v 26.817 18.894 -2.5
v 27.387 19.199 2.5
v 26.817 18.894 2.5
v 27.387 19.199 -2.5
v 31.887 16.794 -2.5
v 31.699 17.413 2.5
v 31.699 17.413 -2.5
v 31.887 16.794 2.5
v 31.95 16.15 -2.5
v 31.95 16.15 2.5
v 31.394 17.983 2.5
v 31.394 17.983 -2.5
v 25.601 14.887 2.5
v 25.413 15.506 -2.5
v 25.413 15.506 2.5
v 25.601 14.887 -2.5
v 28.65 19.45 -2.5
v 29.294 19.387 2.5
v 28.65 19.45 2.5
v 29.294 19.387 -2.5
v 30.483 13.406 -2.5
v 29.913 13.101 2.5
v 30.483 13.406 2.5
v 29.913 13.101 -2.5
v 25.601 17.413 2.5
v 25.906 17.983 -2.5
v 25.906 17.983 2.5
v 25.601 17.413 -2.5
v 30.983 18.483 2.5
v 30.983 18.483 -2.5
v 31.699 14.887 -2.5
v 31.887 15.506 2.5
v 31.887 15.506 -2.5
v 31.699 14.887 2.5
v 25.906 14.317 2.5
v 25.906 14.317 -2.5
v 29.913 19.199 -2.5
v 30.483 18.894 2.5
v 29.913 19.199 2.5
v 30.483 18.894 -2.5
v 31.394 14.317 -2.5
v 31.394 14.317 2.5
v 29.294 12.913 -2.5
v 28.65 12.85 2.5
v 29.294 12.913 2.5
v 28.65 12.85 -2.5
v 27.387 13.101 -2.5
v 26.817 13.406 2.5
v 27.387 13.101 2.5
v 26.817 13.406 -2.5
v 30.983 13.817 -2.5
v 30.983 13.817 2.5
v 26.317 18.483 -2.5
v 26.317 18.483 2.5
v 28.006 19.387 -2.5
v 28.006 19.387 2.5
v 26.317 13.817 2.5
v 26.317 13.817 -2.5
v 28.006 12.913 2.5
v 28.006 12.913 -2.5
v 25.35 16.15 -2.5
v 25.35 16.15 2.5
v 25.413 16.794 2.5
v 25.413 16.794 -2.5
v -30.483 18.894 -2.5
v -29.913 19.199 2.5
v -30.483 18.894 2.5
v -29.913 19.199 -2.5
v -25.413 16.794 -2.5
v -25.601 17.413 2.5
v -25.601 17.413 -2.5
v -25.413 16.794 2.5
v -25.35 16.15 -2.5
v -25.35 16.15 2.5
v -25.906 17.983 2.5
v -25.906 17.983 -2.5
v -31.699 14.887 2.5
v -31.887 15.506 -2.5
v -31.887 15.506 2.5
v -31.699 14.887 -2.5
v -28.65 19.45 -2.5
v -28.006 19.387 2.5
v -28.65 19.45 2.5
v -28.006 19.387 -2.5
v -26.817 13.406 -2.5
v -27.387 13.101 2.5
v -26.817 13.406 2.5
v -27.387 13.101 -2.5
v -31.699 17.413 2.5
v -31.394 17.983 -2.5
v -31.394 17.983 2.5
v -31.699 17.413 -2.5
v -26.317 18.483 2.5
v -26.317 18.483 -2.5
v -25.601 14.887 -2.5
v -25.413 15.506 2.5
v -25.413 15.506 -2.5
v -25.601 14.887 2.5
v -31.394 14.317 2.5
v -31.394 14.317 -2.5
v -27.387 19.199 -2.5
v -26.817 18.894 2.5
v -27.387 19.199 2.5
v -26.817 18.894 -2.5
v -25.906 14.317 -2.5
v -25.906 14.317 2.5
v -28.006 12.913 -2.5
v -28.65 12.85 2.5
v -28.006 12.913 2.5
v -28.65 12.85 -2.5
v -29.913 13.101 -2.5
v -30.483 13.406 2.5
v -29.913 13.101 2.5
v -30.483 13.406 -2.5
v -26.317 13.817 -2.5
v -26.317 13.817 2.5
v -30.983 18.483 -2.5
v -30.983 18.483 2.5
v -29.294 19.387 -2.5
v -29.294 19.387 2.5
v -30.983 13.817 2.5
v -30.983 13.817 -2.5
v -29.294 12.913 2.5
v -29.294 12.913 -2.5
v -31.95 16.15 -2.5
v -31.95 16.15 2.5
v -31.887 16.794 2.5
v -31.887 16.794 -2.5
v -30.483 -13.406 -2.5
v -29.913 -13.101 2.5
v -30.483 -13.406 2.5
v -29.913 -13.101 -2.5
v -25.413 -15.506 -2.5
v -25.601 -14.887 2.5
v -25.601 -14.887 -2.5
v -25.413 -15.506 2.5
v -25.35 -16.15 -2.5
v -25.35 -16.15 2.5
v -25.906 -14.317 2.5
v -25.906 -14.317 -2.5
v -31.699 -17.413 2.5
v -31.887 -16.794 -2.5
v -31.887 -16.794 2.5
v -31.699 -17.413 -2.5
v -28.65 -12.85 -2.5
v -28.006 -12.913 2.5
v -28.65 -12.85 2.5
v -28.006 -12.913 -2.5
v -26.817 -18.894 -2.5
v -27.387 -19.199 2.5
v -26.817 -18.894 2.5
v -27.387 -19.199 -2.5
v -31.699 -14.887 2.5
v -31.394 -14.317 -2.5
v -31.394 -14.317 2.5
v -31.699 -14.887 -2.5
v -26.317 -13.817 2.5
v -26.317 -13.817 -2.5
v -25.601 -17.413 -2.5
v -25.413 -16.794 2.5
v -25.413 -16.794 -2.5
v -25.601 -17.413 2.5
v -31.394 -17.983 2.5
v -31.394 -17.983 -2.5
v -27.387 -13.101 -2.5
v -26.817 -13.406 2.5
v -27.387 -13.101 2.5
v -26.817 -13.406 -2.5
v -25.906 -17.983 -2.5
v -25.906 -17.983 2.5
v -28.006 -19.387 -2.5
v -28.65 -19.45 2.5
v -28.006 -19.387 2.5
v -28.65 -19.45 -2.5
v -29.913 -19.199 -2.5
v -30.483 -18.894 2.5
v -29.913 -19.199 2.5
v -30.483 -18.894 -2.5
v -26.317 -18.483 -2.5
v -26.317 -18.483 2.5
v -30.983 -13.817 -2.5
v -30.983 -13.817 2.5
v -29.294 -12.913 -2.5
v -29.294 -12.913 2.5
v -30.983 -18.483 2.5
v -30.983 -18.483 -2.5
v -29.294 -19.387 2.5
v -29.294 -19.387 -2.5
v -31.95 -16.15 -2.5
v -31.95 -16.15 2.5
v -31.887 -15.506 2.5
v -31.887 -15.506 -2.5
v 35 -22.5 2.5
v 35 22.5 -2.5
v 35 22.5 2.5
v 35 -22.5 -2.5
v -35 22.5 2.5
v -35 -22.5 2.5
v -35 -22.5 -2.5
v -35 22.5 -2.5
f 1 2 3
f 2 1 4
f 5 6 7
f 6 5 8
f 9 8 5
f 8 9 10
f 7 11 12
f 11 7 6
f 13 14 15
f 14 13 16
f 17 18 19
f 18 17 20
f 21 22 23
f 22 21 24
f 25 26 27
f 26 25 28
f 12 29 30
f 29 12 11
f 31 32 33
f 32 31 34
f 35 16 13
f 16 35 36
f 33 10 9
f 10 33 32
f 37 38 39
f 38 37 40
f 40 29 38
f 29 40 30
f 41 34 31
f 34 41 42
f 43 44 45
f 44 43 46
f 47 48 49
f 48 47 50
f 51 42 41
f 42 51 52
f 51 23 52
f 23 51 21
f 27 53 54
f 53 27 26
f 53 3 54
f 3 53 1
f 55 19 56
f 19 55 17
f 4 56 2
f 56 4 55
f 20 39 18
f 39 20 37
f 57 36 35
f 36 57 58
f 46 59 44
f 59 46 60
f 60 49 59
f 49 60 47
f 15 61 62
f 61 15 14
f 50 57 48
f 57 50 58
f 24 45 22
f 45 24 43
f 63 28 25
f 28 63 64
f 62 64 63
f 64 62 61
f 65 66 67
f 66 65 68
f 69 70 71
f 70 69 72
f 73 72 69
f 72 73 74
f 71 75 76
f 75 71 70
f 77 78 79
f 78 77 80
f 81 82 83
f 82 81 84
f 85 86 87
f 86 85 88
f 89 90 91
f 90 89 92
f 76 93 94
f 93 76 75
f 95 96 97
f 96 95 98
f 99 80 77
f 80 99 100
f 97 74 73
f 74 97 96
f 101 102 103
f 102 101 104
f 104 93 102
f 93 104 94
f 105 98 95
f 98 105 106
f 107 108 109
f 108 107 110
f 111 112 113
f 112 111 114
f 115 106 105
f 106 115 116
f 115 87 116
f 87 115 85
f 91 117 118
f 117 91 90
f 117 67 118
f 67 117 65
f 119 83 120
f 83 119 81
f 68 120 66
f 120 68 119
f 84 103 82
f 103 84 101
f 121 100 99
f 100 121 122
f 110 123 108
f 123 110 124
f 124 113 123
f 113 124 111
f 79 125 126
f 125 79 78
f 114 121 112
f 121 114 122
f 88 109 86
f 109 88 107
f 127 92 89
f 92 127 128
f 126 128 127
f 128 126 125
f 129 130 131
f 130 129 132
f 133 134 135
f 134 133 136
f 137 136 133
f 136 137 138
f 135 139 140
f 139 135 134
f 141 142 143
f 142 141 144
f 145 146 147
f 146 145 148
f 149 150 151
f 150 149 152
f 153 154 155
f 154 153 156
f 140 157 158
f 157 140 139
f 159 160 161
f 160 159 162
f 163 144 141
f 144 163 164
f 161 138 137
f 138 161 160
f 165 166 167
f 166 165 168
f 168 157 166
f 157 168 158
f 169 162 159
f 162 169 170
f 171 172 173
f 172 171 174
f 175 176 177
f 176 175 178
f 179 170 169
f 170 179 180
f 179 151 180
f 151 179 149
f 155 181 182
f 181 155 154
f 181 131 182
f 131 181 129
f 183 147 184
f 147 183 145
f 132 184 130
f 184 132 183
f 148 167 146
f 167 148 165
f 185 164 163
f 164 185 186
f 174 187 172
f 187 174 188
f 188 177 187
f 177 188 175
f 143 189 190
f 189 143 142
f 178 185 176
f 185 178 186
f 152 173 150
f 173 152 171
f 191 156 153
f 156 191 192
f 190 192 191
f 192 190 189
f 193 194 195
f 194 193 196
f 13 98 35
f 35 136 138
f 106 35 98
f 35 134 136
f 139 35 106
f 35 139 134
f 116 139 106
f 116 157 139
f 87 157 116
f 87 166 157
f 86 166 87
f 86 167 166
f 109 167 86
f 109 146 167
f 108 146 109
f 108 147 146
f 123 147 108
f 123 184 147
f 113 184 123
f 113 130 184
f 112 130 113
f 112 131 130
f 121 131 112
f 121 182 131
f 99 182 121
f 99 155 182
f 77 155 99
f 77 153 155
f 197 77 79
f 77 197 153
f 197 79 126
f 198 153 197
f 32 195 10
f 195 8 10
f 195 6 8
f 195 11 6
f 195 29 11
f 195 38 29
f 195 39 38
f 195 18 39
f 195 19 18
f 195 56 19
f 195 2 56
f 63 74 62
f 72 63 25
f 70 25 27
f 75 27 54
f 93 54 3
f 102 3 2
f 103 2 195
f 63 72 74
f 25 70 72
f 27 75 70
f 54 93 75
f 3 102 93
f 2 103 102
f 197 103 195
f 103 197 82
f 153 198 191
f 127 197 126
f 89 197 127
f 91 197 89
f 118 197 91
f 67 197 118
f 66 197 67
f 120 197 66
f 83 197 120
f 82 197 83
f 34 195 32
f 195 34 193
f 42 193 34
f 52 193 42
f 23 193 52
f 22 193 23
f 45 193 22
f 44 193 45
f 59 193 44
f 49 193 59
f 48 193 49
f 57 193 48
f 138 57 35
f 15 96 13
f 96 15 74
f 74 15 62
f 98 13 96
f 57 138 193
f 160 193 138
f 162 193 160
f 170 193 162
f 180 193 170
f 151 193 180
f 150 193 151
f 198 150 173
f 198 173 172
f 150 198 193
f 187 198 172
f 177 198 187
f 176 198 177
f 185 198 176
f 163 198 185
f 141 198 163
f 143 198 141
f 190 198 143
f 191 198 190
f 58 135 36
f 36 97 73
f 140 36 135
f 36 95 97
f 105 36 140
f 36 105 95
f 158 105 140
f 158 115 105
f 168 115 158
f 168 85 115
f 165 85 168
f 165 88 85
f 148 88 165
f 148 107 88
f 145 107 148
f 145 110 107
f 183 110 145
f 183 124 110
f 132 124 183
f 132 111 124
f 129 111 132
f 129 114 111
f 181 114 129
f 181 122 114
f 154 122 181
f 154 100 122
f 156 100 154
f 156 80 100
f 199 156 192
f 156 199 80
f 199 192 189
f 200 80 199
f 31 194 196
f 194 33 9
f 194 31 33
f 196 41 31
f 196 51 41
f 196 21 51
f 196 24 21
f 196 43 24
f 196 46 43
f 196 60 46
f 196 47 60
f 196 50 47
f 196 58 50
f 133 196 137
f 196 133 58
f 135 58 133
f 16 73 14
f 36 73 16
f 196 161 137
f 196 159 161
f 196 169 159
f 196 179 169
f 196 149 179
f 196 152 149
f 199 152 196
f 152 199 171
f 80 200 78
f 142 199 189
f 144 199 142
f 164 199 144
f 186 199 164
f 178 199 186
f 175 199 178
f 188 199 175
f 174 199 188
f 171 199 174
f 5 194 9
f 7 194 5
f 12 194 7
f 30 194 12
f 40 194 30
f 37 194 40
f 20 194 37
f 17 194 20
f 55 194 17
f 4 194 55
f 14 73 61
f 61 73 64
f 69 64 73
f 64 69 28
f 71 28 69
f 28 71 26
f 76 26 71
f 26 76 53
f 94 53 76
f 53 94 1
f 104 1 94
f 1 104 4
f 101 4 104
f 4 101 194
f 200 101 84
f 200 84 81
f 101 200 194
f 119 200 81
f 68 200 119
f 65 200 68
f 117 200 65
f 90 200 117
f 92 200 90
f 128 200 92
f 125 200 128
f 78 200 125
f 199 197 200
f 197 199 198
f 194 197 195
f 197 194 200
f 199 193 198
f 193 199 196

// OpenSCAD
$fn = 32;

// ----------------------------------------------------------------------
// Corner plate 70 x 45 x 5
// 3 holes, centres taken from the edge offset
// ----------------------------------------------------------------------

// --- parameters (mm) ---
plate = [70, 45, 5];  // overall size (x, y, z)
holes = 3;            // number of holes the drawing asks for
hole_d = 6.6;         // hole diameter
edge = 6.35;          // hole centre offset from the plate edge

// --- derived feature positions (mm) ---
corner_x = plate[0] / 2 - edge;  // = 28.65   corner hole X
corner_y = plate[1] / 2 - edge;  // = 16.15   corner hole Y
feature_centers = [
  [corner_x, corner_y],
  [-corner_x, corner_y],
  [-corner_x, -corner_y]
];   // hole centres the loop below drills

// plate outline, every hole drilled through with the same cutters
difference() {
  cube(plate, center = true);
  for (centre = feature_centers)
    translate([centre[0], centre[1], 0])
      cylinder(d = hole_d, h = plate[2] + 2, center = true);
}
